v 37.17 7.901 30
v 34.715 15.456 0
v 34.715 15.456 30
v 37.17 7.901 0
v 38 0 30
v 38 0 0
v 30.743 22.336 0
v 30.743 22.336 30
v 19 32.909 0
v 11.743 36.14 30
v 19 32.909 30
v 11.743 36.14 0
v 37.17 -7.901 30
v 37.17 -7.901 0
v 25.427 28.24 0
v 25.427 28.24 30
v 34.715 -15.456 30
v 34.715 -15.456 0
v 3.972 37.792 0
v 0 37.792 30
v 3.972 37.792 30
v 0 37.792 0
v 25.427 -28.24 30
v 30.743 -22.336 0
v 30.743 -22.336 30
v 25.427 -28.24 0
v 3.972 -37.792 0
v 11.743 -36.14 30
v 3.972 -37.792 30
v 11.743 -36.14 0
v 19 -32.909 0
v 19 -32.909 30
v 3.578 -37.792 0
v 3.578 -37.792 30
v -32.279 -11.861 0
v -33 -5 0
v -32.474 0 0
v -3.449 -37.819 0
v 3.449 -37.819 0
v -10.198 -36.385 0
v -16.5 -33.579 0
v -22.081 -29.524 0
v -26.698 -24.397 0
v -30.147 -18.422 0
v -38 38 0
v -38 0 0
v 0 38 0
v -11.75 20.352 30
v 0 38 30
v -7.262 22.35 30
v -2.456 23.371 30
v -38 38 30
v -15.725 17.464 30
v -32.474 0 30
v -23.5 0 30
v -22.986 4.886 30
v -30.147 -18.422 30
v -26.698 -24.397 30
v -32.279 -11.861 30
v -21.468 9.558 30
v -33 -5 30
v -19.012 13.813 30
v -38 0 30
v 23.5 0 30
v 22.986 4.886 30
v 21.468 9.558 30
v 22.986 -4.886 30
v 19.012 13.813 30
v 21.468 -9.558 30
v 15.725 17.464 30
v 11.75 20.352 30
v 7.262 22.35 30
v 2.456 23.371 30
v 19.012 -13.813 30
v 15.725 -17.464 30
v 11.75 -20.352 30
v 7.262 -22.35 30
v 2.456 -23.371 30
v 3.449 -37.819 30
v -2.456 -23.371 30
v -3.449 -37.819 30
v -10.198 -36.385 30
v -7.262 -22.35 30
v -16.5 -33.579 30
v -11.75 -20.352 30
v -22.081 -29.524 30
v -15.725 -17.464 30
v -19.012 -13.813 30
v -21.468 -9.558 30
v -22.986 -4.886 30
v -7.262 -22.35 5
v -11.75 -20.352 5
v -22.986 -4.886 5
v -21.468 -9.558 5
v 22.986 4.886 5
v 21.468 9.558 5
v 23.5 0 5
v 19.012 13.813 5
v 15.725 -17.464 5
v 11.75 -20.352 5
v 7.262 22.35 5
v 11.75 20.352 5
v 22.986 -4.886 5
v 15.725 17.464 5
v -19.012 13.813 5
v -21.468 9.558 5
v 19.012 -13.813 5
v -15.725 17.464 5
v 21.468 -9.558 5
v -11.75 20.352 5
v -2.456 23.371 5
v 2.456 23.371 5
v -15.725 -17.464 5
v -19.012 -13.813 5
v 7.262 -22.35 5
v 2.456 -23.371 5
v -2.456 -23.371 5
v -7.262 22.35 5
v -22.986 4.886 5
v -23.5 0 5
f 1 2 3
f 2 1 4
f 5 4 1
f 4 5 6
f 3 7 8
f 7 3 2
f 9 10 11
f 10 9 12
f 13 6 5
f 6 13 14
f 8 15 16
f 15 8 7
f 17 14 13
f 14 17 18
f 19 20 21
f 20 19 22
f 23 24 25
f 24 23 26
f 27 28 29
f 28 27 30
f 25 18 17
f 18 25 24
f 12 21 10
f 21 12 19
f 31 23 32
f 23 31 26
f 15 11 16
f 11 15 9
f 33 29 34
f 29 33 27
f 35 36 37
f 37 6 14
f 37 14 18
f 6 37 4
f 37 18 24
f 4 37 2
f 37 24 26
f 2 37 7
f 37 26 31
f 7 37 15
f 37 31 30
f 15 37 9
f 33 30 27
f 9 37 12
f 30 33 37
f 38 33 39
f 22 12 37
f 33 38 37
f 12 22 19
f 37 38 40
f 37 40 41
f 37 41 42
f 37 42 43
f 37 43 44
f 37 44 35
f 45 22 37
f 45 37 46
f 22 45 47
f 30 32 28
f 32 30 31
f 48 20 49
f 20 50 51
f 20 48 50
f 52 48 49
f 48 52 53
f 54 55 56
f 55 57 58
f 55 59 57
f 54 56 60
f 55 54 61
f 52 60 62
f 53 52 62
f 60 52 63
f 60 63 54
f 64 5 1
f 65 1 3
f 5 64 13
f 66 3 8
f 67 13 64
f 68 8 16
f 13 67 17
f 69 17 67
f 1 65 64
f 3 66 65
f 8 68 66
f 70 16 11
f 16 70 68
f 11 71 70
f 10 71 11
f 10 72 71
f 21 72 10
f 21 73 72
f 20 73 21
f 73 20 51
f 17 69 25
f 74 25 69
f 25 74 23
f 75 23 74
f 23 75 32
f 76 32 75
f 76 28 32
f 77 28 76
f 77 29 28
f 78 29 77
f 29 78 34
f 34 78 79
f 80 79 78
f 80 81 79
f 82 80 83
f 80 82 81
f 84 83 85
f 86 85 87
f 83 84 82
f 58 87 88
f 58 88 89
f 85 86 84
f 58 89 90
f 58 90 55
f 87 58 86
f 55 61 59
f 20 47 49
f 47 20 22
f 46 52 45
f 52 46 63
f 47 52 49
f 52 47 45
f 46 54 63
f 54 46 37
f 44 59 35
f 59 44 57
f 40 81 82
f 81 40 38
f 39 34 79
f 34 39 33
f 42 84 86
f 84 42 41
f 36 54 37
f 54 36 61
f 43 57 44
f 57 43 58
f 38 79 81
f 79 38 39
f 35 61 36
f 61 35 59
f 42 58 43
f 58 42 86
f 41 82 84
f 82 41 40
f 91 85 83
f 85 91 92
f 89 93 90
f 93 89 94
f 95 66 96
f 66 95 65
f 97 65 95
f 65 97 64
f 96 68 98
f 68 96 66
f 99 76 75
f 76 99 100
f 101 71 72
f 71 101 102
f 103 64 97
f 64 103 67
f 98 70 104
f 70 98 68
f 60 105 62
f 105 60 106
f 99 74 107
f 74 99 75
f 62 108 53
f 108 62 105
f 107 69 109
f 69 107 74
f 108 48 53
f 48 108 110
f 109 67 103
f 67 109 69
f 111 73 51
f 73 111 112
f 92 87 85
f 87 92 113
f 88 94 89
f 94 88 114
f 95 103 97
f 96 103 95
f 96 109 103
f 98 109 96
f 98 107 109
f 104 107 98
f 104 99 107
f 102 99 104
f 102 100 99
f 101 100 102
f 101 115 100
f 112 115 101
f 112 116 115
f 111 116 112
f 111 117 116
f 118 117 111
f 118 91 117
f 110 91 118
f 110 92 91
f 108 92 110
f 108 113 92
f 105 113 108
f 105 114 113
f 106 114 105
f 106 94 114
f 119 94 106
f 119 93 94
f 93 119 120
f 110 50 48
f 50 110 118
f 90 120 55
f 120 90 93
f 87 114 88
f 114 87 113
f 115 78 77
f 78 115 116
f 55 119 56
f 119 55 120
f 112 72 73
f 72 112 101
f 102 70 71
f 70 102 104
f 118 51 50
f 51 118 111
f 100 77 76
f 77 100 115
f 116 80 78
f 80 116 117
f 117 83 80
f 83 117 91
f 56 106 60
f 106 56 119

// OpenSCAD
module 40mm_fan() {
	color("DimGrey") difference() {
		cube([40,40,10],false);
		translate([20,20,0]) cylinder(30,38/2,38/2,true);
		for(x=[-16,16]) for(y=[-16,16]) translate([x+20,y+20,0]) cylinder(30,3/2,3/2,true);
	}
}

module 76mm_turbine() {
	color("DimGrey") difference() {
		union() {
			translate([-76/2,0,0]) cube([76/2,76/2,30],false);
			difference() {
				translate([0,0,15])cylinder(30,76/2,76/2,true);
				rotate([0,0,180]) translate([0,-76,-5])cube([76*2,76*2,40],false);
			}
			translate([0,-5,15])cylinder(30,66/2,66/2,true);
		}
	translate([0,0,20]) cylinder(30,47/2,47/2,true);
	}
}

//40mm_fan();
76mm_turbine();
